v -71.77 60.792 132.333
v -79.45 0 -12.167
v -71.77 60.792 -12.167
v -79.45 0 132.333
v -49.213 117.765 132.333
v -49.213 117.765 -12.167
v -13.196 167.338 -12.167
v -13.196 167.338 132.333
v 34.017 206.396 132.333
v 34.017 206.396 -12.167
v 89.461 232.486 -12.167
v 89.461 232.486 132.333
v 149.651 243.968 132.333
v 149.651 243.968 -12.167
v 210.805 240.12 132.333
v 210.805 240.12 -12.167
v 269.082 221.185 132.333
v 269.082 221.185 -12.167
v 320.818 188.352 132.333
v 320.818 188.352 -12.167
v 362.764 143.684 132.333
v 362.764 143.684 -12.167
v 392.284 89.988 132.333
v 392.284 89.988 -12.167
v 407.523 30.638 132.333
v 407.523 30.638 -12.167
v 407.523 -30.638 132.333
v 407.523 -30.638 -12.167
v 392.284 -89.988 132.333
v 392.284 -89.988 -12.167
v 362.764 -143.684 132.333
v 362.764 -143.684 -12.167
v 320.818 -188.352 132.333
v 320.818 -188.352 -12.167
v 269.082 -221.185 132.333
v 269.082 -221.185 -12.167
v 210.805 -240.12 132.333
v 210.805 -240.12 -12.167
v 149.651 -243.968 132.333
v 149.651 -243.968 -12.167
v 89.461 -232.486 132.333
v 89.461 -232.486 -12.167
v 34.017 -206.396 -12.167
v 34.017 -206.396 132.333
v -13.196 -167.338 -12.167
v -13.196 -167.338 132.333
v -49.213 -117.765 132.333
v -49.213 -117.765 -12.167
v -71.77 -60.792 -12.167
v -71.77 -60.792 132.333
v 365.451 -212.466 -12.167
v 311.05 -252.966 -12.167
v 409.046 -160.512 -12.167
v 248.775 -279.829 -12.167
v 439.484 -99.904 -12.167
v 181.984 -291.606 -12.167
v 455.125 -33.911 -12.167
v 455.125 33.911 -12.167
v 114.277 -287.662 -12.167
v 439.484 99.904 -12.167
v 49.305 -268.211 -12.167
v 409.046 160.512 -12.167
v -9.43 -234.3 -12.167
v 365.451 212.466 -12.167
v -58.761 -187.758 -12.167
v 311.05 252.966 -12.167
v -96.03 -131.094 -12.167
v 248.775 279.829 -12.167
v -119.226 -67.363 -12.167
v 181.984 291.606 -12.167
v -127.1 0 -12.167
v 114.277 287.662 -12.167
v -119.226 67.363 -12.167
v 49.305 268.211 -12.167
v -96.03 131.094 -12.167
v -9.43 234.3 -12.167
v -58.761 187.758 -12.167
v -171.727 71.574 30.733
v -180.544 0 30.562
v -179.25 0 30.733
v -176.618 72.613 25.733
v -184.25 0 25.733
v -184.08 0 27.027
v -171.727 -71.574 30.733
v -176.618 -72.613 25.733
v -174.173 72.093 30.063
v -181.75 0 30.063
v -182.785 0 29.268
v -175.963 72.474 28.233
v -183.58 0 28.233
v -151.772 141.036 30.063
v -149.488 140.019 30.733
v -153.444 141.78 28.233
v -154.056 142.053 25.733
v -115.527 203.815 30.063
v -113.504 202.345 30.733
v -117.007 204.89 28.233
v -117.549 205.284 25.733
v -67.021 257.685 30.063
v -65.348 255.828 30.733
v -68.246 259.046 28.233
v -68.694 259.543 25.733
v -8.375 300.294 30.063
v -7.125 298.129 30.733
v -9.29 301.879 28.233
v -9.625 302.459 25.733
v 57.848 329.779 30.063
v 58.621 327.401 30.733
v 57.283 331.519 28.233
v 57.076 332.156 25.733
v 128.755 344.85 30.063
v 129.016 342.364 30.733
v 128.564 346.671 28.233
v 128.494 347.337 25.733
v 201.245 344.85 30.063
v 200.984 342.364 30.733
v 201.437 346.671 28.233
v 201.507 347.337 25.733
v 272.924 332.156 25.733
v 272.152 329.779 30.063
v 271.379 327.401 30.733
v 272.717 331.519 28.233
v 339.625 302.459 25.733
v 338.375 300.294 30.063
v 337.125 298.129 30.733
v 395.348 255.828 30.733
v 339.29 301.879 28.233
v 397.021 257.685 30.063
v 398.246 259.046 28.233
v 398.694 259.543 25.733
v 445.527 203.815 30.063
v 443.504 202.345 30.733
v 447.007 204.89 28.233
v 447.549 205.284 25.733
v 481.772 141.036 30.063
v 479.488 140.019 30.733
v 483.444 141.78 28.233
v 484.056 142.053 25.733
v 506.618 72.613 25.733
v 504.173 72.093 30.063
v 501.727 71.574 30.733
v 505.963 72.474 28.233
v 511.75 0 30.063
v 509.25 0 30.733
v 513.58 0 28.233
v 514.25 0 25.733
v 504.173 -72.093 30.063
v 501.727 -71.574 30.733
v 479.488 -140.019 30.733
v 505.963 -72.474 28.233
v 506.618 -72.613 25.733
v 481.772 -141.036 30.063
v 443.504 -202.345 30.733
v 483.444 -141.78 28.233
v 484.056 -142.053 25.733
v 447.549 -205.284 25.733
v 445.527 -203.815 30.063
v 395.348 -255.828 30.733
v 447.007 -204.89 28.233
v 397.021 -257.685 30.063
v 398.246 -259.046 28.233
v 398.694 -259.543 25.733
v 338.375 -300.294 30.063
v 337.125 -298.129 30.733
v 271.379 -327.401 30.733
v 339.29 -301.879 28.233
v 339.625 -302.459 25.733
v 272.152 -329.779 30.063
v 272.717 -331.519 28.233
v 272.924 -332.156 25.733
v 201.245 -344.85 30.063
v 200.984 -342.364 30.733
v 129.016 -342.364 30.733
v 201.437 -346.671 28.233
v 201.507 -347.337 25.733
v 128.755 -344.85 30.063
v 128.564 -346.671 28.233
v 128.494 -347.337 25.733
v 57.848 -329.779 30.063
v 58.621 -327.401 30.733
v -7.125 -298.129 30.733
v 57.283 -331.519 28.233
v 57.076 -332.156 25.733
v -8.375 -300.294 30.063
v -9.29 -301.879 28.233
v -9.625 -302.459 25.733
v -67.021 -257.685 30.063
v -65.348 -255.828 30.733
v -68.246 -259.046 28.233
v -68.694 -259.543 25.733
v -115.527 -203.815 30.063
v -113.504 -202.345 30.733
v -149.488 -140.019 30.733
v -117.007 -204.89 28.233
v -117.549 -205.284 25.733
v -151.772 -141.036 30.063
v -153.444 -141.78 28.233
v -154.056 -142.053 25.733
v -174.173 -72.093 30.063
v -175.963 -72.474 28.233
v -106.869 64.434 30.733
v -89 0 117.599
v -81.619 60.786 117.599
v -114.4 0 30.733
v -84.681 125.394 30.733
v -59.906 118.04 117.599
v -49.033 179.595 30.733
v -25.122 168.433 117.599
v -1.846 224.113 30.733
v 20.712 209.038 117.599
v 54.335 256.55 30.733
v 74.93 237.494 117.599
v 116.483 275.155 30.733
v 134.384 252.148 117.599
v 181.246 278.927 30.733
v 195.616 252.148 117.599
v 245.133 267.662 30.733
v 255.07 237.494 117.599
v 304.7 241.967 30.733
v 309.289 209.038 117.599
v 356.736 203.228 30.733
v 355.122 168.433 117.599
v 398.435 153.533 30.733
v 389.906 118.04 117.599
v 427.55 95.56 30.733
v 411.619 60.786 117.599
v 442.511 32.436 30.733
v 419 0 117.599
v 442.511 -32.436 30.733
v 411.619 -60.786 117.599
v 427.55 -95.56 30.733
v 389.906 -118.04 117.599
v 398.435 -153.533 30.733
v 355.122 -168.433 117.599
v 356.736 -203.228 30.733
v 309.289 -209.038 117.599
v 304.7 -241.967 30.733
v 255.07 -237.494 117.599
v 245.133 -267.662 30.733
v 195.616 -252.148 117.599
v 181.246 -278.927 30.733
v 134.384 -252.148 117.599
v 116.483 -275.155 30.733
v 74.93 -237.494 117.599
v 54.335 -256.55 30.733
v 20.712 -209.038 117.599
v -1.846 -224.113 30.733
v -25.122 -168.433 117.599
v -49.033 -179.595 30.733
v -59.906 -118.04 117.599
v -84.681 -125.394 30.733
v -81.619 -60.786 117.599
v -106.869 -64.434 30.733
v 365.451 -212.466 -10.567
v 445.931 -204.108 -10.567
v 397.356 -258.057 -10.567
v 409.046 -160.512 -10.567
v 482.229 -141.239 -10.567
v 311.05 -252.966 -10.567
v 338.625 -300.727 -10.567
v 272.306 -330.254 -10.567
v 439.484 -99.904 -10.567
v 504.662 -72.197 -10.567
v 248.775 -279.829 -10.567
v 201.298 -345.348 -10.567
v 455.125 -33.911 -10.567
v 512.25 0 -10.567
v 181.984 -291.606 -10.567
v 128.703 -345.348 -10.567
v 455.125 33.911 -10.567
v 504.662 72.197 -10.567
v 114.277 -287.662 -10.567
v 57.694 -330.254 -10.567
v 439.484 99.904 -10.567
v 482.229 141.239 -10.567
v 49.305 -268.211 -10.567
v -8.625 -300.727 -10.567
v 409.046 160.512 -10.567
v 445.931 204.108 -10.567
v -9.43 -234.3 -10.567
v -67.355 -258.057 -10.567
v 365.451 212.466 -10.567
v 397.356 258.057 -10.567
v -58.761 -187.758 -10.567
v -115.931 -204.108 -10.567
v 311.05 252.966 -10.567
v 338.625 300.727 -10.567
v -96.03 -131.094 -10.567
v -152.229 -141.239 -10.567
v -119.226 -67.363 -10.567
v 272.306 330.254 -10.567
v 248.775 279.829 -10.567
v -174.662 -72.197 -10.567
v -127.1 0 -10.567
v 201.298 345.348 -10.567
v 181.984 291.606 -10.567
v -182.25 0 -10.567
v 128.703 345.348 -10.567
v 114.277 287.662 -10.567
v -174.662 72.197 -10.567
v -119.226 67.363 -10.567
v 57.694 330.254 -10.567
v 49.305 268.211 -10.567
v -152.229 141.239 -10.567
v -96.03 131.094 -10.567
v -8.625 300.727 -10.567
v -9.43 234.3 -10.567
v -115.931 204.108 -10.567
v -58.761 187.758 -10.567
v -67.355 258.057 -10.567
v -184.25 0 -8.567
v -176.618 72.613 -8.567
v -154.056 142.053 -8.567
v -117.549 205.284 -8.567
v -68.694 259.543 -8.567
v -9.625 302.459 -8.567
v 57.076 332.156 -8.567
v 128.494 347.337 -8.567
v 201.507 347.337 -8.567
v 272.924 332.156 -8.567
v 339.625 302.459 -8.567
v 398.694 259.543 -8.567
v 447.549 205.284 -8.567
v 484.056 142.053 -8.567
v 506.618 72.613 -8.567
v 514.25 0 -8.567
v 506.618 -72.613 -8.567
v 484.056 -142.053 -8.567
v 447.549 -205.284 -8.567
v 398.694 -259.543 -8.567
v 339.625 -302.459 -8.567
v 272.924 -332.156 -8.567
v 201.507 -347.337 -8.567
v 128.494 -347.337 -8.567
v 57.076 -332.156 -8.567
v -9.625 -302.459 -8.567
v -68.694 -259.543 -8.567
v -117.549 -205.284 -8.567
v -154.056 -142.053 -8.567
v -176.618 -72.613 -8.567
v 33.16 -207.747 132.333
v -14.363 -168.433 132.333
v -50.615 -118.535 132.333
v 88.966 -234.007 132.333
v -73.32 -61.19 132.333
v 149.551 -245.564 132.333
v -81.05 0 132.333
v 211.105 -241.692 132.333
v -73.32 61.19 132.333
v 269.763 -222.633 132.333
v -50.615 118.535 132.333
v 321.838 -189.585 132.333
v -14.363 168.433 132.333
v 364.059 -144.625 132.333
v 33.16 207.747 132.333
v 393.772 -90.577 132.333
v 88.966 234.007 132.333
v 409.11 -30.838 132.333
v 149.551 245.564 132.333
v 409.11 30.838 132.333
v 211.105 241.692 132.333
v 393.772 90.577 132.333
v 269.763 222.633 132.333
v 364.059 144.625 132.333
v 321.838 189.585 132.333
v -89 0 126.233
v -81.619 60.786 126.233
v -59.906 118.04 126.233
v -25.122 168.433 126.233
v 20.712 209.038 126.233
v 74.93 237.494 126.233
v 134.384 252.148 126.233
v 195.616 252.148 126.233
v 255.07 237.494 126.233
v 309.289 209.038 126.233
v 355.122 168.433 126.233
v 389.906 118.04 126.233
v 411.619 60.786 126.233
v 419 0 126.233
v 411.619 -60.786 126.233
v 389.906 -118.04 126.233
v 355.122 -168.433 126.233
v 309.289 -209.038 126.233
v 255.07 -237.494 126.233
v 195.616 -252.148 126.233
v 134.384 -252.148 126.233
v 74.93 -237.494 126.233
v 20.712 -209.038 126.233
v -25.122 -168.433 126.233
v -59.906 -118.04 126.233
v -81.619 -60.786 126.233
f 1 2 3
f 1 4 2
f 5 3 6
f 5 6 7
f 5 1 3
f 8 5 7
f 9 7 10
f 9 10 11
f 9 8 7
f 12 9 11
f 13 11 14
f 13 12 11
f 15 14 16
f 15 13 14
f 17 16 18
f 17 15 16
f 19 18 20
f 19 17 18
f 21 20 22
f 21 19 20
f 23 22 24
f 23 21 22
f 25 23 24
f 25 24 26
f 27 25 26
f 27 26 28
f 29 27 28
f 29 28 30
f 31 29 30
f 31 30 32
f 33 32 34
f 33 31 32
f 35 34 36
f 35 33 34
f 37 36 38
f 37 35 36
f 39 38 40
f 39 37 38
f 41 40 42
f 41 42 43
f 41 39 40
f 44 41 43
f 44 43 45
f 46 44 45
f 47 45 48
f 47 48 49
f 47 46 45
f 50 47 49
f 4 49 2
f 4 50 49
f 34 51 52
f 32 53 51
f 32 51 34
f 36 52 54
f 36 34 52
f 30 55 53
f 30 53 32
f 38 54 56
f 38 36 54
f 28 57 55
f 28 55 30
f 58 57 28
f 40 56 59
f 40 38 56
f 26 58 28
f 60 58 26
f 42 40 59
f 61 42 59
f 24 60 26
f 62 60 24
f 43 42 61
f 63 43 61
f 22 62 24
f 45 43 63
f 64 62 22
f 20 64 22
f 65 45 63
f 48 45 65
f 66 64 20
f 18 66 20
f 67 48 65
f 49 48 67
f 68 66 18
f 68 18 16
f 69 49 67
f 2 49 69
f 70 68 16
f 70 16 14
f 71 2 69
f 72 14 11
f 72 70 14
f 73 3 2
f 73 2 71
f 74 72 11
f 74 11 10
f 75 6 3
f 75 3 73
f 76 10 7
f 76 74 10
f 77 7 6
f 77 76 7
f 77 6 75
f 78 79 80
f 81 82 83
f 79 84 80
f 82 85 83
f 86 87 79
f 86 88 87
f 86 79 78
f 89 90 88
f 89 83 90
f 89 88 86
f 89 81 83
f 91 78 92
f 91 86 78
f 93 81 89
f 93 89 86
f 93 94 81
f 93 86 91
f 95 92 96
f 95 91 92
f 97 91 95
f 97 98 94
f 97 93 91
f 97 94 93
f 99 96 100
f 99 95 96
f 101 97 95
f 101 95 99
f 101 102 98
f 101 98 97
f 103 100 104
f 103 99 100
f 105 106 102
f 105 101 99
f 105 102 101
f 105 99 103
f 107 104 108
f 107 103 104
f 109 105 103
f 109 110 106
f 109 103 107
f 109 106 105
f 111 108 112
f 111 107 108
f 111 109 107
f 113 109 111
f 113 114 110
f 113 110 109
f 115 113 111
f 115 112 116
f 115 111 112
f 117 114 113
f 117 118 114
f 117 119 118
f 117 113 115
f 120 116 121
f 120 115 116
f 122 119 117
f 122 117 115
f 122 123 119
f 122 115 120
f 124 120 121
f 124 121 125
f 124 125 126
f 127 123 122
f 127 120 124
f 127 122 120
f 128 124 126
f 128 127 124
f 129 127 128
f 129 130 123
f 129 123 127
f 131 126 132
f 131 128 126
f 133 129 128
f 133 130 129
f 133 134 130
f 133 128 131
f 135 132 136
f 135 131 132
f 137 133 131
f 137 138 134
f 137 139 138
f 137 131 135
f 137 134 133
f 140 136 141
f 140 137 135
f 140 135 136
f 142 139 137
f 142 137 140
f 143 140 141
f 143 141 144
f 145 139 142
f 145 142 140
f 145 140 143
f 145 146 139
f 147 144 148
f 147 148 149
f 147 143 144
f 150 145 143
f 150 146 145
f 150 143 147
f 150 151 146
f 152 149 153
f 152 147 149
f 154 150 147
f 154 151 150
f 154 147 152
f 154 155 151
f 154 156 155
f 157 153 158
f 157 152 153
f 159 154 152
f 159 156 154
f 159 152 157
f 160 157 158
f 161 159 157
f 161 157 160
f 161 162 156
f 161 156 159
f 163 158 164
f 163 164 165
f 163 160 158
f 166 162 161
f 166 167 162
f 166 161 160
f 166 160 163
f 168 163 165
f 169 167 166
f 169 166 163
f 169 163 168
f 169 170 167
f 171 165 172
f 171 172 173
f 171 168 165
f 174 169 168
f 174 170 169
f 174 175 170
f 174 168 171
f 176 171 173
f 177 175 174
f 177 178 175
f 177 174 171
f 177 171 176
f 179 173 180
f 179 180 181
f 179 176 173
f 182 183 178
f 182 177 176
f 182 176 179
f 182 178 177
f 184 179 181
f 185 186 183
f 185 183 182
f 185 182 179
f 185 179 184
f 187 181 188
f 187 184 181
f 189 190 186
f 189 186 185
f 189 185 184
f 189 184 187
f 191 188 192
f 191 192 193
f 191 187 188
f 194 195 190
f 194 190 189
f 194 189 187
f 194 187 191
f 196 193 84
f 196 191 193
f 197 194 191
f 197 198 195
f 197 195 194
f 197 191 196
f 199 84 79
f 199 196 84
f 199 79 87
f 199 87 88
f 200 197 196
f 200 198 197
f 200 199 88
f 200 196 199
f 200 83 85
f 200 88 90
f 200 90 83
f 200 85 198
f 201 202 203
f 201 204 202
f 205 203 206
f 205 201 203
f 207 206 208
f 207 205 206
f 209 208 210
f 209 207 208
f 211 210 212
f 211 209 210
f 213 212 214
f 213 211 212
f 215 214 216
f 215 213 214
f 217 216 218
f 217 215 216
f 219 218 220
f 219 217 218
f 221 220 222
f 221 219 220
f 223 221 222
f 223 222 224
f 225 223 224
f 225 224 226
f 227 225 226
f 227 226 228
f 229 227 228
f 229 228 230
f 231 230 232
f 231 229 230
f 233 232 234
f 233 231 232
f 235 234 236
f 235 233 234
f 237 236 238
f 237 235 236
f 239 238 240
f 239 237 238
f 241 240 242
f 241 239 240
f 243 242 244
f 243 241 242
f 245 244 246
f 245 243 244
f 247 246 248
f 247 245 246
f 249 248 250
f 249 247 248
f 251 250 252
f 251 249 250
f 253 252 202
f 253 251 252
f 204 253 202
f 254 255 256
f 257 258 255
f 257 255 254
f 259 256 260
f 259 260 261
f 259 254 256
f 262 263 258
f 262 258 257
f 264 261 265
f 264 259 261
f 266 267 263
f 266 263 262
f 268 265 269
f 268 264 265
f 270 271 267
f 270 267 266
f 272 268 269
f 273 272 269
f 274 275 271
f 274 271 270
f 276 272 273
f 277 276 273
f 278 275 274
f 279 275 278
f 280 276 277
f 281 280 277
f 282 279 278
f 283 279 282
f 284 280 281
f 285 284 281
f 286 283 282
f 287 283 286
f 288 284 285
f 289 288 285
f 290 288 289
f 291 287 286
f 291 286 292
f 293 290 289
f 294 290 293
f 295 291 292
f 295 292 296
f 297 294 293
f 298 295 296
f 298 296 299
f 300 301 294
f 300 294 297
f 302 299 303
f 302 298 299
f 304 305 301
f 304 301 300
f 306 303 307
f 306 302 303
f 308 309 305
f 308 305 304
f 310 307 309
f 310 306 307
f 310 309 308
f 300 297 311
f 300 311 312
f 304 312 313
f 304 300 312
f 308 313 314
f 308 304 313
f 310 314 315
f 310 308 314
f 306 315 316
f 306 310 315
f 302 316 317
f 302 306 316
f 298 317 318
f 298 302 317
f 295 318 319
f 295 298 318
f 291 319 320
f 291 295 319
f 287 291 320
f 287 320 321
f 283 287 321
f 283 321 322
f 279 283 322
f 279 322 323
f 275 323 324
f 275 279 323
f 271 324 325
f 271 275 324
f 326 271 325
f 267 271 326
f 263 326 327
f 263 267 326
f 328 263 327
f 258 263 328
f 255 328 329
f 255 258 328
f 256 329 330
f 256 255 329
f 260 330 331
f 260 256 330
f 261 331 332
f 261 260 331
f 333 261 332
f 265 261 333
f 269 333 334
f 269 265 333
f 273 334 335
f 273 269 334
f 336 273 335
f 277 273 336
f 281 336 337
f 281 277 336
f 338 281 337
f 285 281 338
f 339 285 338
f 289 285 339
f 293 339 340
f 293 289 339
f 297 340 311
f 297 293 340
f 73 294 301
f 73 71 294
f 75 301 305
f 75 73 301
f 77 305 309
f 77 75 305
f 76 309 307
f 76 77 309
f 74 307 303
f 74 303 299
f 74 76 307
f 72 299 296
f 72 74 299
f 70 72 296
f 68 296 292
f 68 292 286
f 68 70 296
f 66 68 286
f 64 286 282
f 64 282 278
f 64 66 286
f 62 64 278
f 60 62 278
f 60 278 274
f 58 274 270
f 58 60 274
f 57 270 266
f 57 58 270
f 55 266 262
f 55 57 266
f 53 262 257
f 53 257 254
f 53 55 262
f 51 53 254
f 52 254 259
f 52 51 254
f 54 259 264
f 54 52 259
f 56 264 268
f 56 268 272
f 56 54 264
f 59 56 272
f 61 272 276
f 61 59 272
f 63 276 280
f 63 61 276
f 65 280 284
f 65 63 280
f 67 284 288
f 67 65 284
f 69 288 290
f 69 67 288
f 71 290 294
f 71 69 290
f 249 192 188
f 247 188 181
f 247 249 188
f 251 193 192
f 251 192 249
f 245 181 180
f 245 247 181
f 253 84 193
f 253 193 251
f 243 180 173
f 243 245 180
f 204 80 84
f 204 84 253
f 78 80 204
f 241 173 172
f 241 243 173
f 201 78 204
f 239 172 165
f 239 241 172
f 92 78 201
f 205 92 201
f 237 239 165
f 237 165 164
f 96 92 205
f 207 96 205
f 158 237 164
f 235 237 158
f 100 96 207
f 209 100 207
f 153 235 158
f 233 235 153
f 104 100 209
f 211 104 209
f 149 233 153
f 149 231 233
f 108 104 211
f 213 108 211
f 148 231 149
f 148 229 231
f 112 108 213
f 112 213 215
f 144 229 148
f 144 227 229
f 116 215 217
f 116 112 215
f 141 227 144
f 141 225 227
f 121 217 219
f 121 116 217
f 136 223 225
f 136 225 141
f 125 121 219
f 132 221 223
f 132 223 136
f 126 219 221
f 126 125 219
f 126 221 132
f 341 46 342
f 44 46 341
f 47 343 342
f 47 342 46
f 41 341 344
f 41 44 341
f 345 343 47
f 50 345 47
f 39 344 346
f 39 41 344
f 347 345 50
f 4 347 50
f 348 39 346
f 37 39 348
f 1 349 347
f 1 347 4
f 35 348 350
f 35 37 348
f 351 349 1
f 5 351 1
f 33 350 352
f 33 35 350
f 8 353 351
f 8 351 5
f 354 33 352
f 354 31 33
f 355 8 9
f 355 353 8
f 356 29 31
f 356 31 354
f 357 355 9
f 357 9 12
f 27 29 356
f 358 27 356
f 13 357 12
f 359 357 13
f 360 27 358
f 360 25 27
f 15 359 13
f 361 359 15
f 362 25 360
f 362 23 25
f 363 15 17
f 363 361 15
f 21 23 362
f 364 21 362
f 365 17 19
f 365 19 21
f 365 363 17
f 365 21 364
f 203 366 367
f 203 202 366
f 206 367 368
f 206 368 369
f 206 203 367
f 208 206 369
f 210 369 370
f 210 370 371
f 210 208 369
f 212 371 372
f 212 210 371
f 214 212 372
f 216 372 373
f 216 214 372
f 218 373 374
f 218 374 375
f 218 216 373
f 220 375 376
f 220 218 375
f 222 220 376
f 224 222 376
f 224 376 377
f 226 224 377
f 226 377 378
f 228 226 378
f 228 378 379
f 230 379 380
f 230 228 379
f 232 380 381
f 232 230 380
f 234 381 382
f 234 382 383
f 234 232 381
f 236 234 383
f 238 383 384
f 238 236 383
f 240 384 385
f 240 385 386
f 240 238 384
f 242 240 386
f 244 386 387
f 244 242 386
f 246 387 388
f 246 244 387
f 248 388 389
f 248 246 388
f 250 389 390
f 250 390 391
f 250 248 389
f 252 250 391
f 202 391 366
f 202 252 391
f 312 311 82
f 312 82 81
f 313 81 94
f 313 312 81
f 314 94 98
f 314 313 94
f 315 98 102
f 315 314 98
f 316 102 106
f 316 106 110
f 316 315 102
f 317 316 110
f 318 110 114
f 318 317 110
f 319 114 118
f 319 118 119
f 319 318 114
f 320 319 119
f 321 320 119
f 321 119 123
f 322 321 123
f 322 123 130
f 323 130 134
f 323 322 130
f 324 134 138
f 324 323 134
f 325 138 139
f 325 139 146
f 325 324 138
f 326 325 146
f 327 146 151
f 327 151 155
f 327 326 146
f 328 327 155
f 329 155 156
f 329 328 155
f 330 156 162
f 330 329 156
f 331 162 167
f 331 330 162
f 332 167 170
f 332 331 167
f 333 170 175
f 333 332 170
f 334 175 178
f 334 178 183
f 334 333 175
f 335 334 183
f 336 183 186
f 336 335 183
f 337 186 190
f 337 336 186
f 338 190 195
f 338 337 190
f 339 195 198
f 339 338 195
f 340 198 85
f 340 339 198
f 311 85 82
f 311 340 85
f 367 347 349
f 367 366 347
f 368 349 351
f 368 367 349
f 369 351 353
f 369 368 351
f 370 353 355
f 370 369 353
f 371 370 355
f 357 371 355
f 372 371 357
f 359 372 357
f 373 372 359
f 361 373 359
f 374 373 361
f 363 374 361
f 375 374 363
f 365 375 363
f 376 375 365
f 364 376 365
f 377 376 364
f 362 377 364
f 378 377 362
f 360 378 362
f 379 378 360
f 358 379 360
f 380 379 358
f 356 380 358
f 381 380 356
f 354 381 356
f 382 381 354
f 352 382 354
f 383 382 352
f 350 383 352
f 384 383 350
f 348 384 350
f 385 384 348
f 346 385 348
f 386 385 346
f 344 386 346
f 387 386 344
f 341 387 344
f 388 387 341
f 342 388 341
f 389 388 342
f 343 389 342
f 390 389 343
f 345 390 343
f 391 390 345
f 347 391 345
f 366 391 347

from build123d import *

# Parameters (mm, degrees)
F2_R    = 5
F3_SIZE = 2


with BuildPart() as f1:
    # F0 (on Front) → F1 (revolve)
    with BuildSketch(Plane.XZ):
        Polygon((-79.4498865843, -12.1671419008), (-79.4498865843, 132.3328580992), (-81.0498865843, 132.3328580992), (-88.9998865843, 126.2326085448), (-88.9998865843, 117.5993978977), (-114.3998865843, 30.7328580992), (-184.2498865843, 30.7328580992), (-184.2498865843, -10.5671419008), (-127.0998865843, -10.5671419008), (-127.0998865843, -12.1671419008), align=None)
    revolve(axis=Axis((165.0001134157, 0, 0.9622275829), (0, 0, -1)))

    # F2
    f2_edges = [f1.edges().sort_by_distance(p)[0] for p in [
        (514.250113, 0, 30.732858),
    ]]
    fillet(f2_edges, radius=F2_R)

    # F3
    f3_edges = [f1.edges().sort_by_distance(p)[0] for p in [
        (514.250113, 0, -10.567142),
    ]]
    chamfer(f3_edges, length=F3_SIZE)


solid = f1.part
